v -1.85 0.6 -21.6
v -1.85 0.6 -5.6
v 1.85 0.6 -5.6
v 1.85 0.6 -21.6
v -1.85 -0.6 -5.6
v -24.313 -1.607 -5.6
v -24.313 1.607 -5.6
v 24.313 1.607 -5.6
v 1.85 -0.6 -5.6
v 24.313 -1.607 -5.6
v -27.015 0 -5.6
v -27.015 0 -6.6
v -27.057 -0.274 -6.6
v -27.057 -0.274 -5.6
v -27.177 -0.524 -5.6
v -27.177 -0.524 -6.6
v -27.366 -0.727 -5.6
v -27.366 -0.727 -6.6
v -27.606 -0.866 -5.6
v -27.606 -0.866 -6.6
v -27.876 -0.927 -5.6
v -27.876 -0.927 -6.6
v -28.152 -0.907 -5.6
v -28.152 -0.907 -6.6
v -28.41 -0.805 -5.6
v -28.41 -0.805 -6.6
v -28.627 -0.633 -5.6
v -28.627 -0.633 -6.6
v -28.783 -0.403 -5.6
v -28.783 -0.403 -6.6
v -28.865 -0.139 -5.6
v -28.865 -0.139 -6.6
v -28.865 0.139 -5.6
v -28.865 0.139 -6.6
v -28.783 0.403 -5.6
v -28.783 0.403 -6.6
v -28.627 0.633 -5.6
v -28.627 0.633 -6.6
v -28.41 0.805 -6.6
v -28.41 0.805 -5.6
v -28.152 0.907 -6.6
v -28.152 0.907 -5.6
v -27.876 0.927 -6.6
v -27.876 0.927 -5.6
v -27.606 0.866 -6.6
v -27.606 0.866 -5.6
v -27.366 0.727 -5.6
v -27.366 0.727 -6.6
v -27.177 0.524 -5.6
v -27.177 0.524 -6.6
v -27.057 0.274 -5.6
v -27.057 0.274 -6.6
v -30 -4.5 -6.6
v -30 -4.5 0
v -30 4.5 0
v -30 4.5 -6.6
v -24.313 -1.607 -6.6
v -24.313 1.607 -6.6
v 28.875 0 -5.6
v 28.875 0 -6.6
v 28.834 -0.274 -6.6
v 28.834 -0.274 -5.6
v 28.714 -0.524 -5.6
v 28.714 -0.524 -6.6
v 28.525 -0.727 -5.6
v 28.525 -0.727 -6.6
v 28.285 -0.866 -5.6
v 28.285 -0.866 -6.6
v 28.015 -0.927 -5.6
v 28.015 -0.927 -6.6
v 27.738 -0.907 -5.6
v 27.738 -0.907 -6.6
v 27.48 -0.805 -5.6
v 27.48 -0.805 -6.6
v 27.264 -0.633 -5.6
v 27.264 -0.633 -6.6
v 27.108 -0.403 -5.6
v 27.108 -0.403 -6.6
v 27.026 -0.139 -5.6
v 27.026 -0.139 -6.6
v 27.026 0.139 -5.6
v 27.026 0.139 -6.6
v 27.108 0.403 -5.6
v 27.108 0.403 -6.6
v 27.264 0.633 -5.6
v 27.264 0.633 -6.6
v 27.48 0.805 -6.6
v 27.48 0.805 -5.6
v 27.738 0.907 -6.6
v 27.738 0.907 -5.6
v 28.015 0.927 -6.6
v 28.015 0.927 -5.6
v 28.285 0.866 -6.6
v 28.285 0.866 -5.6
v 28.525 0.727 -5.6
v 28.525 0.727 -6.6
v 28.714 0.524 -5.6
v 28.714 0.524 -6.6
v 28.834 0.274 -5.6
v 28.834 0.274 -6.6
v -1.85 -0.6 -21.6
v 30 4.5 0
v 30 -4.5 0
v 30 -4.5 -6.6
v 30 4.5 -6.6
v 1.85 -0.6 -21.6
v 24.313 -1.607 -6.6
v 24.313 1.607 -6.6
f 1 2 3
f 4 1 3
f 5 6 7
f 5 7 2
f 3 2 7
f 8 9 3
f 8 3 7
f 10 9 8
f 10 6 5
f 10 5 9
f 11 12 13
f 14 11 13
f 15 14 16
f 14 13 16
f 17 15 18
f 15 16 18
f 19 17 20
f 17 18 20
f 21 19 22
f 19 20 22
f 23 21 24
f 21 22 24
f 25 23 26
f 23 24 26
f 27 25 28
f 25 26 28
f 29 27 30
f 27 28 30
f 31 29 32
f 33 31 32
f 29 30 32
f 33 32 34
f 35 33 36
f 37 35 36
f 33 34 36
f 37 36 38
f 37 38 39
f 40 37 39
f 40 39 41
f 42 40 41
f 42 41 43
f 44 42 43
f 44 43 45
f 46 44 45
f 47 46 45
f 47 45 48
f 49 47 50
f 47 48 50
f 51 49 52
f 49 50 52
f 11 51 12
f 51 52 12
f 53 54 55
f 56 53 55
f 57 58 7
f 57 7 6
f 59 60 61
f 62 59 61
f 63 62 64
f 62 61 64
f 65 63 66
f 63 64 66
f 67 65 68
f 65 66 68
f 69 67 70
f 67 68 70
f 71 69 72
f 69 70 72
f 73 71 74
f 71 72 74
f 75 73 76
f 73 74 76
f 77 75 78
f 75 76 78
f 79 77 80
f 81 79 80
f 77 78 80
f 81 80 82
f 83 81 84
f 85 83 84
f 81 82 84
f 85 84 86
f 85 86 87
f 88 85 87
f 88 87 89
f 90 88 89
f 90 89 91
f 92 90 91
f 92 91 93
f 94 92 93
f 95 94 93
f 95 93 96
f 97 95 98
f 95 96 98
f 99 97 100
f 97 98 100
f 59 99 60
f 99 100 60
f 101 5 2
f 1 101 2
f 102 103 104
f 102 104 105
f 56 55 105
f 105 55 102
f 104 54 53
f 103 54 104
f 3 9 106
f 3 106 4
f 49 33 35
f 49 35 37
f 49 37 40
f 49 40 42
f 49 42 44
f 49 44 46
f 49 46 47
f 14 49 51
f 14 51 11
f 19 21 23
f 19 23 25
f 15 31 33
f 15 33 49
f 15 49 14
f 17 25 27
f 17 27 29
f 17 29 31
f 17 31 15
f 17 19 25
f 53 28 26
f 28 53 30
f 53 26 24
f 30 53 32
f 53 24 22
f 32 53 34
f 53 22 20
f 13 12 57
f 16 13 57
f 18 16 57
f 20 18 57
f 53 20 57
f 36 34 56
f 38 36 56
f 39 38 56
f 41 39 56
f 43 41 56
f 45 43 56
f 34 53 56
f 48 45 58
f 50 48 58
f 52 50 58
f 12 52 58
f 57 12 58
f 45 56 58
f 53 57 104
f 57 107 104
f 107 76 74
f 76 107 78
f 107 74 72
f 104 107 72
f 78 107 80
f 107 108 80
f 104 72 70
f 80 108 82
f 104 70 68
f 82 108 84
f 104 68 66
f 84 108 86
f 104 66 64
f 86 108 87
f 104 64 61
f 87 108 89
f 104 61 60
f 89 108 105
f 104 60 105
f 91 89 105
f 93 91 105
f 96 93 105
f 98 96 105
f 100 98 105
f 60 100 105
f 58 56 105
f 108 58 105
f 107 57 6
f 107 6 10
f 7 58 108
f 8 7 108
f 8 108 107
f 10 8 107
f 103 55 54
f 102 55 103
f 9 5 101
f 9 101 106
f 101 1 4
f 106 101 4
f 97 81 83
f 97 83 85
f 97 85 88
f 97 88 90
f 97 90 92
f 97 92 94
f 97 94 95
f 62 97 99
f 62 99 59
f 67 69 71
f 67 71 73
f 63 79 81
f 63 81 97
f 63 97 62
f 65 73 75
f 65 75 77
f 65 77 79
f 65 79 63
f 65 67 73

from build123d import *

# Parameters (mm, degrees)
F0_W     = 60
F0_H     = 9
F1_DEPTH = 6.6
F2_W     = 48.626702
F2_H     = 3.214986
F2_R     = 0.929944
F3_DEPTH = 1
F4_W     = 3.7
F4_H     = 1.2
F5_DEPTH = 21.6


with BuildPart() as f1:
    # F0 (on Top) → F1 (new body)
    with BuildSketch(Plane.XY):
        Rectangle(F0_W, F0_H)
    extrude(amount=-F1_DEPTH)

    # F2 (on face) → F3 (cut)
    with BuildSketch(Plane(origin=(0, 0, -6.6), x_dir=(1, 0, 0), z_dir=(0, 0, -1))):
        Rectangle(F2_W, F2_H)
        with Locations((-27.945412, 0)):
            Circle(F2_R)
        with Locations((27.945412, 0)):
            Circle(F2_R)
    extrude(amount=-F3_DEPTH, mode=Mode.SUBTRACT)

    # F4 (on face) → F5 (join)
    with BuildSketch(Plane.XY):
        Rectangle(F4_W, F4_H)
    extrude(amount=-F5_DEPTH)


solid = f1.part
